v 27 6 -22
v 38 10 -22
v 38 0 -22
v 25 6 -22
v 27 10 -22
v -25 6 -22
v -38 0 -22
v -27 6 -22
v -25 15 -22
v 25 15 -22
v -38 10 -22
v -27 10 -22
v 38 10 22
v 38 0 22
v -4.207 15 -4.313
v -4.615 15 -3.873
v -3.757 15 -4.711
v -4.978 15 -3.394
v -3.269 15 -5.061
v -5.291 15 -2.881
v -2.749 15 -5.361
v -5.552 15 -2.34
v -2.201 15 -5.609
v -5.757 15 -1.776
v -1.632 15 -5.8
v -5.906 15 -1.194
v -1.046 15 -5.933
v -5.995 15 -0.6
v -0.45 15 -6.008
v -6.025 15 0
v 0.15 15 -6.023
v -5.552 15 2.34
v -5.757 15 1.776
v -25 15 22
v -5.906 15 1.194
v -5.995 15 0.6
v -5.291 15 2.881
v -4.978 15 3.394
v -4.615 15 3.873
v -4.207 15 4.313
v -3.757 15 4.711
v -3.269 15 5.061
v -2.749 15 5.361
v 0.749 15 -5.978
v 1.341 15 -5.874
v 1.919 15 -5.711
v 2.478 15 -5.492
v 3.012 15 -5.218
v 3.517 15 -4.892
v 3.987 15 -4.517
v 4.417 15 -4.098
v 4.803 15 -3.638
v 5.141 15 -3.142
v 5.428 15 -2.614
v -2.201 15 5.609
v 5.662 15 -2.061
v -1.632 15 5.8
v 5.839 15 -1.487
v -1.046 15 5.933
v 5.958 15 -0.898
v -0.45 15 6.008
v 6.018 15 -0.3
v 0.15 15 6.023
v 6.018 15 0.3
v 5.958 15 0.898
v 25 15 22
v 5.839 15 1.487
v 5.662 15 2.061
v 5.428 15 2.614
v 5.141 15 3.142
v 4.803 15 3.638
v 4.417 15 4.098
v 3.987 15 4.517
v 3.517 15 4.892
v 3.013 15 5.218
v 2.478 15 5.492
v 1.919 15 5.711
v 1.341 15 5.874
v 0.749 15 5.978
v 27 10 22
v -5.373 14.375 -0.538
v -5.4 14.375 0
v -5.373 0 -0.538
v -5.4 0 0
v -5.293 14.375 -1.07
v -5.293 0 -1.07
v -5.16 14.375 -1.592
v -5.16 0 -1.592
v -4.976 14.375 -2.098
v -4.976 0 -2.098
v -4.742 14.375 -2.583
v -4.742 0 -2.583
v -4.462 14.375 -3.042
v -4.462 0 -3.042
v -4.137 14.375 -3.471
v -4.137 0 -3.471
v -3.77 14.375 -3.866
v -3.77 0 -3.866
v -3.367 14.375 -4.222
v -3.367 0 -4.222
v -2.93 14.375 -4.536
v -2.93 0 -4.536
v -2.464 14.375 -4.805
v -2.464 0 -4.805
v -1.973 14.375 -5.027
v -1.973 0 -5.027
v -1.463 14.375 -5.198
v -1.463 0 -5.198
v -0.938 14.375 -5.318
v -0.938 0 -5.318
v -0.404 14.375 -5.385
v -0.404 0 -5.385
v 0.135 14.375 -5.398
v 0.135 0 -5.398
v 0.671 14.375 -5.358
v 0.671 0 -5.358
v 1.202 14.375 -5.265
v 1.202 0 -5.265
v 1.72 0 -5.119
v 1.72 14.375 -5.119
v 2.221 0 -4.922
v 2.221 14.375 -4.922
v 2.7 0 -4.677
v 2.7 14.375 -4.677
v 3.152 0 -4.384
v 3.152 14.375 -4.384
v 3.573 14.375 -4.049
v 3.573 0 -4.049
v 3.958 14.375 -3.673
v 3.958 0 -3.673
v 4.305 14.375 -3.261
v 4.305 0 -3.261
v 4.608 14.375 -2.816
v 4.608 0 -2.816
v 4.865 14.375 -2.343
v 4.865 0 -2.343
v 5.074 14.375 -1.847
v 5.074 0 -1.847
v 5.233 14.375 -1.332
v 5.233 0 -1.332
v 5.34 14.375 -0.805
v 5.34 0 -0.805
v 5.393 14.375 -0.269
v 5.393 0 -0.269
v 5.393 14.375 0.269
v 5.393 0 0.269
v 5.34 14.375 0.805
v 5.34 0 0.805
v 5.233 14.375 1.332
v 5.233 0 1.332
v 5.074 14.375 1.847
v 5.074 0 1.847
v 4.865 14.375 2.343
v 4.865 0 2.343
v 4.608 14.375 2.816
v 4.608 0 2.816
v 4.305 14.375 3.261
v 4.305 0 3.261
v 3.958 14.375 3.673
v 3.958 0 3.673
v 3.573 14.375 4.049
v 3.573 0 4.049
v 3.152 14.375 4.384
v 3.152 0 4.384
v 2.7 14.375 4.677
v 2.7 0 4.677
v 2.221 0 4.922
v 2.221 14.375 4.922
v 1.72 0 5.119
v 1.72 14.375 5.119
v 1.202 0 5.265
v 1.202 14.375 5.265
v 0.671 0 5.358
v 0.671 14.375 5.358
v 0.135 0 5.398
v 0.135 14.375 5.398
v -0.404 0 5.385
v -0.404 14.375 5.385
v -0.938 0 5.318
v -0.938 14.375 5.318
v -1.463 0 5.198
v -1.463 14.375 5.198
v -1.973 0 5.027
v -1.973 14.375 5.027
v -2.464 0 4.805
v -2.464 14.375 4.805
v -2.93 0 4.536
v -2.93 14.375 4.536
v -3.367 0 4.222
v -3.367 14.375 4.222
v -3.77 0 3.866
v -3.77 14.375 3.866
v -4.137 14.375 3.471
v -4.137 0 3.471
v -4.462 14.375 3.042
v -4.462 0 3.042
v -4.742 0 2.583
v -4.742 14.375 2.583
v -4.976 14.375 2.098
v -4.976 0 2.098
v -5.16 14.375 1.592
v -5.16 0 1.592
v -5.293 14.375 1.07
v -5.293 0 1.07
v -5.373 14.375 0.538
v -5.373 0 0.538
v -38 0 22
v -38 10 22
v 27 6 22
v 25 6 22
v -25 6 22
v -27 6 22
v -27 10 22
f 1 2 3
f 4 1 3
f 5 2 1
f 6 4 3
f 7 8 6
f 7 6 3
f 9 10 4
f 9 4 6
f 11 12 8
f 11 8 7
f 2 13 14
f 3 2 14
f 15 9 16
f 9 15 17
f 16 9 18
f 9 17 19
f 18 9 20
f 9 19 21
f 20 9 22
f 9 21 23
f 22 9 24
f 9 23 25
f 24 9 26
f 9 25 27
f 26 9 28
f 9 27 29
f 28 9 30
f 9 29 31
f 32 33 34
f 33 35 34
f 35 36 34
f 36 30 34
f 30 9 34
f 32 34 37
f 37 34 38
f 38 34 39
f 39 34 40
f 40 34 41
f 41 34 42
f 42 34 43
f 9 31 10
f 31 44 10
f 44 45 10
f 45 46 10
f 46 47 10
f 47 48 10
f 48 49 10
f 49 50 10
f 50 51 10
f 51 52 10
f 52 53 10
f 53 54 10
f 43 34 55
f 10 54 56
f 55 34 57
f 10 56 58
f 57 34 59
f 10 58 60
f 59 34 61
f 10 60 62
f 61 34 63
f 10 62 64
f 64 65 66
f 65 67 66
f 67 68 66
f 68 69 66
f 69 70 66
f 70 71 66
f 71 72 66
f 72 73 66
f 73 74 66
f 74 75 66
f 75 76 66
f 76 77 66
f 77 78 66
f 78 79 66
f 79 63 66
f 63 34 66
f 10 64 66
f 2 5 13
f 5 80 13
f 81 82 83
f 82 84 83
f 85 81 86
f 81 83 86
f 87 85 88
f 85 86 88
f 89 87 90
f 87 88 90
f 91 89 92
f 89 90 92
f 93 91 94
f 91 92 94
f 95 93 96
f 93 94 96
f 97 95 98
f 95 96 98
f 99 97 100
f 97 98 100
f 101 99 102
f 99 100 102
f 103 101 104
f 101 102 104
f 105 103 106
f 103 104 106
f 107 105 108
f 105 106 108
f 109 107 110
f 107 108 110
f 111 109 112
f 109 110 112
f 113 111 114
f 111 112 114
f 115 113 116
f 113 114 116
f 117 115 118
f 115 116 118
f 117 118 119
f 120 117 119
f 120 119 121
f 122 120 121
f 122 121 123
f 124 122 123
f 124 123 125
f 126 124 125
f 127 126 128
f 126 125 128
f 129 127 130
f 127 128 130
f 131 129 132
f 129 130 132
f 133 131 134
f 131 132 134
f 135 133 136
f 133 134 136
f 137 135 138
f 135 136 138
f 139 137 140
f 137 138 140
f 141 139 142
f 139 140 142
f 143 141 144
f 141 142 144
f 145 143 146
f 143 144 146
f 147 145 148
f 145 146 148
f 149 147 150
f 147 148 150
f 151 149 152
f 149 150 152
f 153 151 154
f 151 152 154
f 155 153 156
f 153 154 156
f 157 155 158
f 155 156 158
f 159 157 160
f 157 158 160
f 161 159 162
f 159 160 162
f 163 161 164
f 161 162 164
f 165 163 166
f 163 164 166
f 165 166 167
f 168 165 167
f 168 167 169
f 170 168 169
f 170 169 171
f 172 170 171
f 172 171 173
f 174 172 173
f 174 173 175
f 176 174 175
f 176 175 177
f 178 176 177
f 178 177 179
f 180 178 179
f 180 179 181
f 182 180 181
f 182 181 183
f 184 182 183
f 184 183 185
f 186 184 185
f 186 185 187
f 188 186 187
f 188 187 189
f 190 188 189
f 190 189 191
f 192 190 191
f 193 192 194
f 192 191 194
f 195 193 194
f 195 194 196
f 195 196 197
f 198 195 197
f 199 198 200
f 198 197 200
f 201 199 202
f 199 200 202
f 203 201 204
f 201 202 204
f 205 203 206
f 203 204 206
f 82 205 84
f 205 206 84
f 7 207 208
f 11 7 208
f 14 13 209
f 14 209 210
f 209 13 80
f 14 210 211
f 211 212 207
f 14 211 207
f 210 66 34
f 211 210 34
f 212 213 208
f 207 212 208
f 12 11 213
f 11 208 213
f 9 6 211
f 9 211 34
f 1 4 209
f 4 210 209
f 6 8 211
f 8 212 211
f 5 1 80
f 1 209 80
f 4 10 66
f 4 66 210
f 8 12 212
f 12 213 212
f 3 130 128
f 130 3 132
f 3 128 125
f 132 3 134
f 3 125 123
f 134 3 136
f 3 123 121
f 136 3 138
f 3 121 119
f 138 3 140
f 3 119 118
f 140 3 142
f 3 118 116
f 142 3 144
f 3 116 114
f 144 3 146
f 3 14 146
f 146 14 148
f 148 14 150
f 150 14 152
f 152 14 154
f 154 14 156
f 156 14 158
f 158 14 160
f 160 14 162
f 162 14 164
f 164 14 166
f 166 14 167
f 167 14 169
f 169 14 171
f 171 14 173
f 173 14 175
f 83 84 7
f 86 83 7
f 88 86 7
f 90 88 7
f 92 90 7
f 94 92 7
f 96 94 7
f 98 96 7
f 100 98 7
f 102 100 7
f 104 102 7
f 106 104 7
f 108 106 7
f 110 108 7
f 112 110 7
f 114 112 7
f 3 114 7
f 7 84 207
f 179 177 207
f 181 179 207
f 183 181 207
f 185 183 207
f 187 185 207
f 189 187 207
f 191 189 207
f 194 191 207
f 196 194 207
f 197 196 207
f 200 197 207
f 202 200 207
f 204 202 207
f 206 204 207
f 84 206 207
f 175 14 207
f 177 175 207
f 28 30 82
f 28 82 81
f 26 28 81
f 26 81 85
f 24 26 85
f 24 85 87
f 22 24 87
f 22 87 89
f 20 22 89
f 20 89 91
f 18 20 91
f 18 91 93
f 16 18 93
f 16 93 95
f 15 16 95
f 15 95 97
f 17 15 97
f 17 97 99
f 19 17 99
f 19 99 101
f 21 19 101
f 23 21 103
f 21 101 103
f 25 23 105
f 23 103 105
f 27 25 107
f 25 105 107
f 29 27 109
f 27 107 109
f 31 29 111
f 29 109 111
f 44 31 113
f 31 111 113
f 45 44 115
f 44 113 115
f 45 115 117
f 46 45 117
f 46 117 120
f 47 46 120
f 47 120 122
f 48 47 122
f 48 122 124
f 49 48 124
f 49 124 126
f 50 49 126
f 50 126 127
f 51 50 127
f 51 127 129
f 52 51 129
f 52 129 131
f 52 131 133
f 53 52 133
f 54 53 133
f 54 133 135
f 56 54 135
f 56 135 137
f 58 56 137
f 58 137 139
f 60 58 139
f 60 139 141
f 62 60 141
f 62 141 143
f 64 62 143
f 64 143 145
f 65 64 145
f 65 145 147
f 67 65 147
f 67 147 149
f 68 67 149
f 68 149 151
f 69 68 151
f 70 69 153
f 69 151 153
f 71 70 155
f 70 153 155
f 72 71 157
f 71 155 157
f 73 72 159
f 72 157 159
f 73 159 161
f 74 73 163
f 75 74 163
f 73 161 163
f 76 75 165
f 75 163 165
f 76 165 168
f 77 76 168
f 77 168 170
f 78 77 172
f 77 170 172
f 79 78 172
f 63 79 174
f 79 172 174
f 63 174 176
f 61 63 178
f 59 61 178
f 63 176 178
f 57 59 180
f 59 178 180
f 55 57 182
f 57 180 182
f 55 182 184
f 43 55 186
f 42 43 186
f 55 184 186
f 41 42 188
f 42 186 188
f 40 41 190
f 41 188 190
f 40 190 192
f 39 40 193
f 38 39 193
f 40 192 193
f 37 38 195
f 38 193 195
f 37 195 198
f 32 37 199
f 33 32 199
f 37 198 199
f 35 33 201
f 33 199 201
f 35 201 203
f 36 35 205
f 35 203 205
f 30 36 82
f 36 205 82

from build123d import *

# Parameters (mm, degrees)
BOSS_EXTRUDE1_DEPTH               = 22
M12X1_25_TAPPED_HOLE1_D           = 10.8
M12X1_25_TAPPED_HOLE1_CSINK_D     = 12.05
M12X1_25_TAPPED_HOLE1_CSINK_ANGLE = 90


with BuildPart() as part:
    # Sketch1 → Boss-Extrude1 (new, symmetric)
    with BuildSketch(Plane.XY):
        Polygon((-38, 0), (-38, 10), (-27, 10), (-27, 6), (-25, 6), (-25, 15), (25, 15), (25, 6), (27, 6), (27, 10), (38, 10), (38, 0), align=None)
    extrude(amount=BOSS_EXTRUDE1_DEPTH, both=True)

    # M12x1.25 Tapped Hole1 (through all)
    with Locations(Plane(origin=(0, 15, 0), x_dir=(1, 0, 0), z_dir=(0, 1, 0))):
        with Locations((0, 0)):
            CounterSinkHole(M12X1_25_TAPPED_HOLE1_D / 2, M12X1_25_TAPPED_HOLE1_CSINK_D / 2, counter_sink_angle=M12X1_25_TAPPED_HOLE1_CSINK_ANGLE)


solid = part.part
